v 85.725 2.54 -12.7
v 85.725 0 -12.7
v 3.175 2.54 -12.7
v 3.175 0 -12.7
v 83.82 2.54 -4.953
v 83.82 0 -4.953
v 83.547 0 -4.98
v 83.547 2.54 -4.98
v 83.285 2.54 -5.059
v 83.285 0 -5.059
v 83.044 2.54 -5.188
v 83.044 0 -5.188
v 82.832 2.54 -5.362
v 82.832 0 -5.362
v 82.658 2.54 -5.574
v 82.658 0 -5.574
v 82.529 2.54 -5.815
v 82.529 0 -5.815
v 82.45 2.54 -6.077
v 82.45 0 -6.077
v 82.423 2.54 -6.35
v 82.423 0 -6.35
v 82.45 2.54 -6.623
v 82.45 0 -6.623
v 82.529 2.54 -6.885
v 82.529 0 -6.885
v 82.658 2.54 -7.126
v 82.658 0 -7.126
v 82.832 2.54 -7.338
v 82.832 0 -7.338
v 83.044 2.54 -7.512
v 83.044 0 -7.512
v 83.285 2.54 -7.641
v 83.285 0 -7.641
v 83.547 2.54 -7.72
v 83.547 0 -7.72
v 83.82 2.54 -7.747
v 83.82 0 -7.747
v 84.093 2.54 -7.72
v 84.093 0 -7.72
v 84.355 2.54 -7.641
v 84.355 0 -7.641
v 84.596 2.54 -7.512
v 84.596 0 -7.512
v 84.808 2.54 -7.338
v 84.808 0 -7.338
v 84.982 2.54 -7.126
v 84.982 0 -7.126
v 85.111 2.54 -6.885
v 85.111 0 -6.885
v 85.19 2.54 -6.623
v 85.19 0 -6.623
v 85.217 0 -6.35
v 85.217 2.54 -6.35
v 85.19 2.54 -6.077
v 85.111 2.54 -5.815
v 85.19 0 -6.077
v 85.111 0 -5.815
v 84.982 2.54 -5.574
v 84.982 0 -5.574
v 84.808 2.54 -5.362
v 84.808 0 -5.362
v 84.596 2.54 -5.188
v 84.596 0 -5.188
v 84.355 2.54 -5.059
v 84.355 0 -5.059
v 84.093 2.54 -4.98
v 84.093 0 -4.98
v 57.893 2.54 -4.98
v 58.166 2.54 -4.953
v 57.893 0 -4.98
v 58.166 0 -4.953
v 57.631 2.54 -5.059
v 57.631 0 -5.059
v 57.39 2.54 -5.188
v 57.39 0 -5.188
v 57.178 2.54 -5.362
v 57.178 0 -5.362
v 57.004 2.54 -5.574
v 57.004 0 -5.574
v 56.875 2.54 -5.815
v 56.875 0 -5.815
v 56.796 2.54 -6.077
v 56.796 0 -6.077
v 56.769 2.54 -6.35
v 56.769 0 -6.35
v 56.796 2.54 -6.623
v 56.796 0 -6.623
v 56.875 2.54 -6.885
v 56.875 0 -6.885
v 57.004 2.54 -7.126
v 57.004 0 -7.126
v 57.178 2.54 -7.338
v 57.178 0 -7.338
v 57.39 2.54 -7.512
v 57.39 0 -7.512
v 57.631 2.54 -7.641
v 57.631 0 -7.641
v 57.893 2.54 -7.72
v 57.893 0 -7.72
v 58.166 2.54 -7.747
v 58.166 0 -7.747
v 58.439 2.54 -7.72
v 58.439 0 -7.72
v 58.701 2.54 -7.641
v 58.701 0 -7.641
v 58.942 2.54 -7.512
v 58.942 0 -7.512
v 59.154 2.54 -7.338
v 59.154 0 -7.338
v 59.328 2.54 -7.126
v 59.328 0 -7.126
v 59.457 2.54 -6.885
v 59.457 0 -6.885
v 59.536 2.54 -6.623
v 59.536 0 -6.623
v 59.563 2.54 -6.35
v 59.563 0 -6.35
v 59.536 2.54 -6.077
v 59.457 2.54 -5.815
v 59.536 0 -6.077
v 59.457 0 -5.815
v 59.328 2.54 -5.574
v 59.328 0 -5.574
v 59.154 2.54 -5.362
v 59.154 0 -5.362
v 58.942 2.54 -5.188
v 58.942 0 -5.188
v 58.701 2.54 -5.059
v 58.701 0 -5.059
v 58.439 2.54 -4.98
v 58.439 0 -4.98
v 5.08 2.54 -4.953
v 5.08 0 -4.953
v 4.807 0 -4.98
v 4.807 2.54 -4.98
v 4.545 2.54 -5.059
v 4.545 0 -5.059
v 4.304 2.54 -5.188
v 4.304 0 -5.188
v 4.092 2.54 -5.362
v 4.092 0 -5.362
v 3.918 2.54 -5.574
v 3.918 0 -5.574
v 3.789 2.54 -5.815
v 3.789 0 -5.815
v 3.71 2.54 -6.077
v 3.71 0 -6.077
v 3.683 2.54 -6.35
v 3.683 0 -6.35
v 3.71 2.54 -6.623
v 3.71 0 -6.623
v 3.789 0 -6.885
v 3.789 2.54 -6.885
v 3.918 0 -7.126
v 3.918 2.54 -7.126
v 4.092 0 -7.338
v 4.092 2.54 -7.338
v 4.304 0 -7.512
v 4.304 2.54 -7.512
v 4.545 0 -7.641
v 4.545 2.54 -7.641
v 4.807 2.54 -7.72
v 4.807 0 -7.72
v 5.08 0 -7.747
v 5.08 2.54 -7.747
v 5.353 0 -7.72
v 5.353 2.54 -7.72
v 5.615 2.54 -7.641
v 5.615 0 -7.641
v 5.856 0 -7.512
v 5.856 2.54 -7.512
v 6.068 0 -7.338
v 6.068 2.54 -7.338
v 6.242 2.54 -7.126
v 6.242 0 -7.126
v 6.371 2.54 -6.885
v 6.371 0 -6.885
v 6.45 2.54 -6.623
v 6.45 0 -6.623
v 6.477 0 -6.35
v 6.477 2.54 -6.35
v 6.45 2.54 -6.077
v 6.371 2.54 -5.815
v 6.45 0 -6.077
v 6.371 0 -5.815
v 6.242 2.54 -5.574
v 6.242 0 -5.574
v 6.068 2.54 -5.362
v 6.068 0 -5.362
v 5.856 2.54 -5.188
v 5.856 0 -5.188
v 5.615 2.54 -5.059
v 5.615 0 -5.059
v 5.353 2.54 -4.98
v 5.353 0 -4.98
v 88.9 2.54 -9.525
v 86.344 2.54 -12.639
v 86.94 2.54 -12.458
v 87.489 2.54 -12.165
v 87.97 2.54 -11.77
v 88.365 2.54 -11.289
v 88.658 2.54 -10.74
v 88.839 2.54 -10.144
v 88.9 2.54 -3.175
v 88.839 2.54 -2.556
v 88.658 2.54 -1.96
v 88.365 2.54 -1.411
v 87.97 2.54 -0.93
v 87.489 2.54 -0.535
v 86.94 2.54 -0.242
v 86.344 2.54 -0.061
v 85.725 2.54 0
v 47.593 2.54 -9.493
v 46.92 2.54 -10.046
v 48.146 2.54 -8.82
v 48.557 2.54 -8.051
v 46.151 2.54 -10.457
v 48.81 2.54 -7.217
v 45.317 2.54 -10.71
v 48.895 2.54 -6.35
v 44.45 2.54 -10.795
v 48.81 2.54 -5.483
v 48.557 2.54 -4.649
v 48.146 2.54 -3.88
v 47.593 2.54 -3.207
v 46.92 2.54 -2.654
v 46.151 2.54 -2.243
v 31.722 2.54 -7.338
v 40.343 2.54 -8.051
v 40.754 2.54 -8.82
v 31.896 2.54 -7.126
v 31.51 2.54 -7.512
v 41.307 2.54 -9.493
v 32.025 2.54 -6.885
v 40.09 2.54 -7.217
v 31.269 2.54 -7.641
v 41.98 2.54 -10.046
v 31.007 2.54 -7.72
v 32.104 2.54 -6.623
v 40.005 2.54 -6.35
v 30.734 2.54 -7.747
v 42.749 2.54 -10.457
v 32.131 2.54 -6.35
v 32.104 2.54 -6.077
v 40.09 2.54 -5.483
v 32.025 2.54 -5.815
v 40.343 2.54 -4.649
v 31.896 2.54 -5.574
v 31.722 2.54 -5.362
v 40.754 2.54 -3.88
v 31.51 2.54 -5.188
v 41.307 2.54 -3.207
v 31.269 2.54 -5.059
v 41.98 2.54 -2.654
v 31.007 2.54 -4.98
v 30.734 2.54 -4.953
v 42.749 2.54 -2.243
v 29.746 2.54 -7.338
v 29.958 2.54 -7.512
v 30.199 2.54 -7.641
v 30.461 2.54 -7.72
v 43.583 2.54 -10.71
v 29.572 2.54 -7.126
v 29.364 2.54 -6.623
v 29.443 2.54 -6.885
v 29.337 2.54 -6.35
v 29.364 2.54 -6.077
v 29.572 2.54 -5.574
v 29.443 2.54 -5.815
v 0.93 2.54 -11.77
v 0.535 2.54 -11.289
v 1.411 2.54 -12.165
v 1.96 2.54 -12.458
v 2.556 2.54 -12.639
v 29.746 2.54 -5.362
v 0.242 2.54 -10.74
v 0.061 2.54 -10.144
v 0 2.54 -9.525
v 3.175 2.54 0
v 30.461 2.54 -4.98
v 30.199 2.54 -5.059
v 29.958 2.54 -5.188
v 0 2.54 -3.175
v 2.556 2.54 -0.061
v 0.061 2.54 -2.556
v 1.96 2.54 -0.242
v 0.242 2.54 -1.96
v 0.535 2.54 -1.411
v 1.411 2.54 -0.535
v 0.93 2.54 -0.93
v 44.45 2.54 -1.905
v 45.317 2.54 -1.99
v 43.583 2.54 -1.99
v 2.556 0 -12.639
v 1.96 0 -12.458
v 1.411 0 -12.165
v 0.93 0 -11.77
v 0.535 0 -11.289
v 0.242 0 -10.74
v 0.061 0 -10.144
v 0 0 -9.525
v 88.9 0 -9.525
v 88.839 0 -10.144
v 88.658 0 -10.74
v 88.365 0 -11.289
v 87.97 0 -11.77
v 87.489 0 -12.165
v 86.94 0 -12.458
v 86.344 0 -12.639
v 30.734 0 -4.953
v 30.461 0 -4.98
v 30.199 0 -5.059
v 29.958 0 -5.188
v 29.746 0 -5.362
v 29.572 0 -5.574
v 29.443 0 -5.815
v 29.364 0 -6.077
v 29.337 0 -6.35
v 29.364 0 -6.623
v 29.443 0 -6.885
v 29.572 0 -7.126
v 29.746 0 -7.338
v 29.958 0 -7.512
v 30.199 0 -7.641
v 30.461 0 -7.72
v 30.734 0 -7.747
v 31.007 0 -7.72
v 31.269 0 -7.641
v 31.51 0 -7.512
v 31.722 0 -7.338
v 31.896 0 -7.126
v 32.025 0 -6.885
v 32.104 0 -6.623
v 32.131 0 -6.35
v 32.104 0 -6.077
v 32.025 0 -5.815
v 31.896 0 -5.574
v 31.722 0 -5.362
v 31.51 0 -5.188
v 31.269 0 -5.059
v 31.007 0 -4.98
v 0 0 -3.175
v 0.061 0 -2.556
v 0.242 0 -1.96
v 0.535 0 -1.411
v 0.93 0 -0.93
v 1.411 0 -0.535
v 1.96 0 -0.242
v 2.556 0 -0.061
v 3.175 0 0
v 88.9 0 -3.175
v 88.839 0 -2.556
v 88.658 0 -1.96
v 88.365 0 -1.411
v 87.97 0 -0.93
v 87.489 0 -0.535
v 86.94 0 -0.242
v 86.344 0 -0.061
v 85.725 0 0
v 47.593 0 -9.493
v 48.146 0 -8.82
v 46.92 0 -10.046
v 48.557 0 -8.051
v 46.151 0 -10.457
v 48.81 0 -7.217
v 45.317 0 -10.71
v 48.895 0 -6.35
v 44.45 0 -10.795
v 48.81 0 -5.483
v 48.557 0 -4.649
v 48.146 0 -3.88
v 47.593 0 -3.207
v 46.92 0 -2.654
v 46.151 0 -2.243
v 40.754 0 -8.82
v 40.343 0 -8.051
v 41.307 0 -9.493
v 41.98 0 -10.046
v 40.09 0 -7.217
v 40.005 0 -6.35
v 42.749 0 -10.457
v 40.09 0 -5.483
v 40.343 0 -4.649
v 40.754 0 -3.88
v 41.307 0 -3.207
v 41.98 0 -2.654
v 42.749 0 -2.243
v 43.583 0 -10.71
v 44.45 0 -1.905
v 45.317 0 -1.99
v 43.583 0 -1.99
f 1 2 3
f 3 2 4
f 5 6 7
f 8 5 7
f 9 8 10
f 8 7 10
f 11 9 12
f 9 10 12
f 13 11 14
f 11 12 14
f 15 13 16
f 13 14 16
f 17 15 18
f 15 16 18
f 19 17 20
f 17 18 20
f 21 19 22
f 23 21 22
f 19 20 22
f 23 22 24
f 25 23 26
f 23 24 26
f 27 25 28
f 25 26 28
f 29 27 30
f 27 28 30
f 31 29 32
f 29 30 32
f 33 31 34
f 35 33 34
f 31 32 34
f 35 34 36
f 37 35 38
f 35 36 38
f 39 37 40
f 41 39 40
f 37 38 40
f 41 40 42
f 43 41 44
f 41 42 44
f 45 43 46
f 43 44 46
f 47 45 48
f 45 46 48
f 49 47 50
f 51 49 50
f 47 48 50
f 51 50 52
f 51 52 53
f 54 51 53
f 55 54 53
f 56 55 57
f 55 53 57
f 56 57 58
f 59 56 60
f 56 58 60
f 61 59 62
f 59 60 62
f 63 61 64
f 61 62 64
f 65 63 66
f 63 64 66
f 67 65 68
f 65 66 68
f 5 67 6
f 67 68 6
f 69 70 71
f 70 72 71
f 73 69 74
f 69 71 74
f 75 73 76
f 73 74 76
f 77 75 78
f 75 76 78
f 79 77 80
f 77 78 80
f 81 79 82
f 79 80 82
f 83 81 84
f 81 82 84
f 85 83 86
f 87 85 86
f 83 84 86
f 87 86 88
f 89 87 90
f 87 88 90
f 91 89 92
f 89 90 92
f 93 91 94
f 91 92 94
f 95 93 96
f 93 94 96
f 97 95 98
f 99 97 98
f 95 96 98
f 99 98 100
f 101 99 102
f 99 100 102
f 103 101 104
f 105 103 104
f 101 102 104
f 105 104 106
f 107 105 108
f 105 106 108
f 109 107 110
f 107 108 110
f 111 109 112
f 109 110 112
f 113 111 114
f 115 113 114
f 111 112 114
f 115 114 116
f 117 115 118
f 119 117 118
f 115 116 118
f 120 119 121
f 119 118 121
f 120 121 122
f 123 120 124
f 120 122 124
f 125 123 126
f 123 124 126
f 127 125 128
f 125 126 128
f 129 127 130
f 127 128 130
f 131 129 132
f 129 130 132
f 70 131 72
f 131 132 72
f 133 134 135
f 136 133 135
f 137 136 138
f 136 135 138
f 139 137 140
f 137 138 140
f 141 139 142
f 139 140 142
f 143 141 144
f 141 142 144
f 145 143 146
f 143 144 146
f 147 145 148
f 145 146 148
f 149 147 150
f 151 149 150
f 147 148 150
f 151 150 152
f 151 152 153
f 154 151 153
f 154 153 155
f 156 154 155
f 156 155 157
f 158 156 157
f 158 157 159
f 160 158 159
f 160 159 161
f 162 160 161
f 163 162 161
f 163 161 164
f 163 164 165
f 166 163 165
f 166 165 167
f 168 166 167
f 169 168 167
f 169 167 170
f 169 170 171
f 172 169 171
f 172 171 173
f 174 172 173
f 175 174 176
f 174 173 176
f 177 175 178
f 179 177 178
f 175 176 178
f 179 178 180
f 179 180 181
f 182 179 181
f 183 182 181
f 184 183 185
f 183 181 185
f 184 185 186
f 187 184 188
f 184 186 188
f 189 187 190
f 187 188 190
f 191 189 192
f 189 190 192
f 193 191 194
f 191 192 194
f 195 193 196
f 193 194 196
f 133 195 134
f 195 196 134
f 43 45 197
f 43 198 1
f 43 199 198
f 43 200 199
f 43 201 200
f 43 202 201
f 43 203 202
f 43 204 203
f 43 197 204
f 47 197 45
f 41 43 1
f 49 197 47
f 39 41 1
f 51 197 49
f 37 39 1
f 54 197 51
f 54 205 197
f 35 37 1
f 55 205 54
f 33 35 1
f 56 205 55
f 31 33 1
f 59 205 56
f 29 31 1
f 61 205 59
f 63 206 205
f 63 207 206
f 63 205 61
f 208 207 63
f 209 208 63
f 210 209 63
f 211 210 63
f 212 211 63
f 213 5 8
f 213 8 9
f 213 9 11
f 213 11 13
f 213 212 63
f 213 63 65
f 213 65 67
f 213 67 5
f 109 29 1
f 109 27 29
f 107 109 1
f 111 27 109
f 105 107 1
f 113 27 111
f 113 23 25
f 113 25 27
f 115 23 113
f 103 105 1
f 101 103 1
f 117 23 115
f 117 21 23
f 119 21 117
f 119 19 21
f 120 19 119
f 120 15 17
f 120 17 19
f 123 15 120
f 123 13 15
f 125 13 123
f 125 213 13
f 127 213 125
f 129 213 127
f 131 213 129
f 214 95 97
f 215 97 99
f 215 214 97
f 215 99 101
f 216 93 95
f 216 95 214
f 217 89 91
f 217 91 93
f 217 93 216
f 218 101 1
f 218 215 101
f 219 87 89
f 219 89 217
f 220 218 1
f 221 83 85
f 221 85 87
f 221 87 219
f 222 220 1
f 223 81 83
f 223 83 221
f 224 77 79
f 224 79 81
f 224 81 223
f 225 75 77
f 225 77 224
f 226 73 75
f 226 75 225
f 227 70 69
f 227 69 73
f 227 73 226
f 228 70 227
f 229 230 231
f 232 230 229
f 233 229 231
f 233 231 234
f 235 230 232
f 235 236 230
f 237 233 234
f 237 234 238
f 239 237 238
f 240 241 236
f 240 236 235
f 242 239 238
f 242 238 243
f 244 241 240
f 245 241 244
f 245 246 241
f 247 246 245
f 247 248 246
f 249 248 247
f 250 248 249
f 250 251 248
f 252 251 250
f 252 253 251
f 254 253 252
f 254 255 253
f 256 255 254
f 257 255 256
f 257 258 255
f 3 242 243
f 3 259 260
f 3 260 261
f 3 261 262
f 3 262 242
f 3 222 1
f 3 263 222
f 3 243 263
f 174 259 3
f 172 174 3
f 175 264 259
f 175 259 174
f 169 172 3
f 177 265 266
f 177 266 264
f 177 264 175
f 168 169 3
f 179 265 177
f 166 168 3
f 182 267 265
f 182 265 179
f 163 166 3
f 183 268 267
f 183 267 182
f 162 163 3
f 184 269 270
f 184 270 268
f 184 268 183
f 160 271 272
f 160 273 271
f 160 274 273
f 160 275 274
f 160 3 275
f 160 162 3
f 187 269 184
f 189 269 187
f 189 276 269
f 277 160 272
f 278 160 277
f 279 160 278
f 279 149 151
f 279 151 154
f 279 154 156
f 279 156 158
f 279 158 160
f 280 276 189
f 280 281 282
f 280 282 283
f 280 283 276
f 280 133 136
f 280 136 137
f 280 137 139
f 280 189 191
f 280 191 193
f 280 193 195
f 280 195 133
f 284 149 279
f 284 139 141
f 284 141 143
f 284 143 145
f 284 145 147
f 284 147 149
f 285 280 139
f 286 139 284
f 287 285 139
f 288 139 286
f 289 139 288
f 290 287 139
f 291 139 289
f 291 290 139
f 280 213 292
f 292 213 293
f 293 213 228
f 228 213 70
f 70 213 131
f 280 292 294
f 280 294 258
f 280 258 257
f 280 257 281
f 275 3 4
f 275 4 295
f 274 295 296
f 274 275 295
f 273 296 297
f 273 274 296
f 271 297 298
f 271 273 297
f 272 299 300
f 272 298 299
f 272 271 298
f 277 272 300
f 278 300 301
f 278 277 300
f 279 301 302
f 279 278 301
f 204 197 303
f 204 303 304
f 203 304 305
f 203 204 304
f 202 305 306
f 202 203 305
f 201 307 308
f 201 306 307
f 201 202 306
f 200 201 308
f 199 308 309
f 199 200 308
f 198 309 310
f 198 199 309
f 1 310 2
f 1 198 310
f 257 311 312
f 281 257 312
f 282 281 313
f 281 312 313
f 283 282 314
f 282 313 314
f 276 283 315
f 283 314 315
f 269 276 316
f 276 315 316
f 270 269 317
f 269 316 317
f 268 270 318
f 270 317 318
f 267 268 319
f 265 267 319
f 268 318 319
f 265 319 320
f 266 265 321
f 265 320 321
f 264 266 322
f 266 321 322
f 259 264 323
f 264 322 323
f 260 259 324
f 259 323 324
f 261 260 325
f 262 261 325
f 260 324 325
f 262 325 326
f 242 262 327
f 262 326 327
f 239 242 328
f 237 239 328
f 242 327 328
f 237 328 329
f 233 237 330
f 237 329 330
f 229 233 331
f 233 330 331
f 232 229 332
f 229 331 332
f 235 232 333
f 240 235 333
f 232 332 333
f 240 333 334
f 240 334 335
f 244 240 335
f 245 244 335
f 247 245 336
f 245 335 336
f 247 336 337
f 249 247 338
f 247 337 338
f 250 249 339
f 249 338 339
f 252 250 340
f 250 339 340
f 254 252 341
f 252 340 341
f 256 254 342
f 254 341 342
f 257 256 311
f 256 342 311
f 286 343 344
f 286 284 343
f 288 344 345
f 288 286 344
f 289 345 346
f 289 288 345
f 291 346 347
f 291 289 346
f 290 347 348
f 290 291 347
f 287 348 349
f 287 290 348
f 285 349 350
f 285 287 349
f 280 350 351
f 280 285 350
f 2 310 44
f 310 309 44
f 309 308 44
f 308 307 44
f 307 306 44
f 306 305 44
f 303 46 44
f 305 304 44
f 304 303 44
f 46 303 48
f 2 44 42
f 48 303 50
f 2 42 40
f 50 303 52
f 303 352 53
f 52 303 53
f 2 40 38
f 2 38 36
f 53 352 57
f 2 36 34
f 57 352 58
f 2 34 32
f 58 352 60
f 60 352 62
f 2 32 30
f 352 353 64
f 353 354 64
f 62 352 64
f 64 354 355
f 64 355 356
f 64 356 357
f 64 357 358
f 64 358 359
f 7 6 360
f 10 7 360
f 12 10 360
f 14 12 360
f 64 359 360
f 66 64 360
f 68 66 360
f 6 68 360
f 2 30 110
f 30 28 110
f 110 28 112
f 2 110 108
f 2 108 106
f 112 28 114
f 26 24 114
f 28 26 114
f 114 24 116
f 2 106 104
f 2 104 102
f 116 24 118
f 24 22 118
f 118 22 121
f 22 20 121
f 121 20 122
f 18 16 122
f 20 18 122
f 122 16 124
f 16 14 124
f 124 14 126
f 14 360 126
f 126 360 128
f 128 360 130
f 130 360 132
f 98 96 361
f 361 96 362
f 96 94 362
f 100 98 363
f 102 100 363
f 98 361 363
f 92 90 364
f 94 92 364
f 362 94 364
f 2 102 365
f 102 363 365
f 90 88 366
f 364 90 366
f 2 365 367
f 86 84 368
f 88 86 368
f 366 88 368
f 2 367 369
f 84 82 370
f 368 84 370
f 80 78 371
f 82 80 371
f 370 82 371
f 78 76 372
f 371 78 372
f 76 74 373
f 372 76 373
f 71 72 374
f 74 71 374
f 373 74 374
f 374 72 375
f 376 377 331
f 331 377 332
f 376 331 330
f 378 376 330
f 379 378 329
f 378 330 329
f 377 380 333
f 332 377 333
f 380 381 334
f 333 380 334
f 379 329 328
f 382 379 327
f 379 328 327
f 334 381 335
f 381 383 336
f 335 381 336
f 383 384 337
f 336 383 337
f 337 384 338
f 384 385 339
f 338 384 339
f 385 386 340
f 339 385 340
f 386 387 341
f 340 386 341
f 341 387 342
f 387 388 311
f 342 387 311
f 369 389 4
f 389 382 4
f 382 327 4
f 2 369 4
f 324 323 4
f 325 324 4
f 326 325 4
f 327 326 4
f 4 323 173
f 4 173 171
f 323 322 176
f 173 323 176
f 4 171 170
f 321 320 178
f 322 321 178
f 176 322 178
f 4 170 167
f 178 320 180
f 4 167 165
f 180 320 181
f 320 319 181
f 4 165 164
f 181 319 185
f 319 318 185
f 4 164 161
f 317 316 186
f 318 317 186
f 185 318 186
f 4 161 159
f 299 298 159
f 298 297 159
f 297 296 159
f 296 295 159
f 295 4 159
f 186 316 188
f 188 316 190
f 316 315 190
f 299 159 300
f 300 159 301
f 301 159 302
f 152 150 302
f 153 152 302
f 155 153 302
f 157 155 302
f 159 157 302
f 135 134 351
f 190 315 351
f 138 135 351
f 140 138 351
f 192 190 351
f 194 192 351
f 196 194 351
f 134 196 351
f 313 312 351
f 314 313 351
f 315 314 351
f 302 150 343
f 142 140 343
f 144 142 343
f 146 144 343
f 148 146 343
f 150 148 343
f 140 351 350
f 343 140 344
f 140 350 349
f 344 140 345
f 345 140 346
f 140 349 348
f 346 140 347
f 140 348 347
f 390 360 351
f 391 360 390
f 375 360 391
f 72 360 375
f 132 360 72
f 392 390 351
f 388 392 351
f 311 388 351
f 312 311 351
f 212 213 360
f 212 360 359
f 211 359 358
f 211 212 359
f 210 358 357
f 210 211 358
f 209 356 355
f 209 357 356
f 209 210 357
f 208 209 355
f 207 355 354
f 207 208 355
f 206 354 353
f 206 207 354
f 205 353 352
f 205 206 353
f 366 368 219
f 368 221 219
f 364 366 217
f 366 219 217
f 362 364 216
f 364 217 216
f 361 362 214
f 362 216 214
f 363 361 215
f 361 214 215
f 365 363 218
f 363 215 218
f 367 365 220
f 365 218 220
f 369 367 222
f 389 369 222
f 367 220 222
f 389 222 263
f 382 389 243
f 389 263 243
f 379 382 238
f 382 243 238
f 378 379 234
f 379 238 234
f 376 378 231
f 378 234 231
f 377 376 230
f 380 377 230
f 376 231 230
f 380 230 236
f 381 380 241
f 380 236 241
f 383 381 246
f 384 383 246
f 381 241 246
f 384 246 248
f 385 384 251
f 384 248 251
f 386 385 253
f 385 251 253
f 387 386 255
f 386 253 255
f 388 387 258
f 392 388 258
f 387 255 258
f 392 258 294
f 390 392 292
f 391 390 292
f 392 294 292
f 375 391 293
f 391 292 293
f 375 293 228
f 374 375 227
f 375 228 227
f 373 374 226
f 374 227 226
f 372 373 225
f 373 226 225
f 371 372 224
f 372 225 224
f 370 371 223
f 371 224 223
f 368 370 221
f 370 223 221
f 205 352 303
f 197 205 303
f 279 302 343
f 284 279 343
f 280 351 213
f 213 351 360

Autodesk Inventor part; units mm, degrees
ref_plane "YZ Plane" through (0, 0, 0) normal (1, 0, 0) x (0, 1, 0)
ref_plane "XZ Plane" through (0, 0, 0) normal (0, 1, 0) x (-1, 0, 0)
ref_plane "XY Plane" through (0, 0, 0) normal (0, 0, 1) x (1, 0, 0)
sketch "Sketch1" plane through (0, 0, 0) normal (0, 1, 0) x (-1, 0, 0)
  line L0 (0, 0) -> (-88.9, 0)
  line L1 (-88.9, 0) -> (-88.9, -12.7)
  line L2 (-88.9, -12.7) -> (0, -12.7)
  line L3 (0, -12.7) -> (0, 0)
  dimension "d0" = 88.9
  dimension "d1" = 12.7
extrude "Extrusion1" add sketch "Sketch1" along normal blind 2.54
fillet "Fillet1" radius 3.175 4 edges at (88.9, 1.27, 0) (88.9, 1.27, -12.7) (0, 1.27, -12.7) (0, 1.27, 0)
sketch "Sketch2" plane through (0, 2.54, 0) normal (0, 1, 0) x (1, 0, 0)
  line L0 (88.9, 3.175) -> (88.9, 9.525) projected
  line L1 (88.9, 6.35) -> (44.45, 6.35)
  circle A0 centre (44.45, 6.35) radius 4.445
  point P0 (0, 0)
  dimension "d5" = 44.45
  dimension "d6" = 8.89
extrude "Extrusion2" cut sketch "Sketch2" against normal blind 2.54
sketch "Sketch3" plane through (0, 2.54, 0) normal (0, 1, 0) x (1, 0, 0)
  line L0 (3.175, 0) -> (85.725, 0) projected
  line L1 (44.45, 0) -> (44.45, 12.7)
  line L2 (85.725, 12.7) -> (3.175, 12.7) projected
  line L3 (44.45, 6.35) -> (58.166, 6.35)
  point P0 (0, 0)
  dimension "d9" = 13.716
hole "Hole1" at (58.166, 2.54, -6.35) direction (0, -1, 0) diameter 2.794 end through all
sketch "Sketch4" plane through (0, 2.54, 0) normal (0, 1, 0) x (1, 0, 0)
  line L0 (85.725, 12.7) -> (3.175, 12.7) projected
  line L1 (44.45, 12.7) -> (44.45, 0)
  line L2 (3.175, 0) -> (85.725, 0) projected
  line L3 (44.45, 6.35) -> (30.734, 6.35)
  point P0 (0, 0)
  dimension "d17" = 13.716
hole "Hole2" at (30.734, 2.54, -6.35) direction (0, -1, 0) diameter 2.794 end through all
sketch "Sketch5" plane through (0, 2.54, 0) normal (0, 1, 0) x (1, 0, 0)
  line L0 (0, 9.525) -> (0, 3.175) projected
  line L1 (0, 6.35) -> (5.08, 6.35)
  point P0 (0, 0)
  dimension "d25" = 5.08
hole "Hole3" at (5.08, 2.54, -6.35) direction (0, -1, 0) diameter 2.794 end through all
sketch "Sketch6" plane through (0, 2.54, 0) normal (0, 1, 0) x (1, 0, 0)
  line L0 (88.9, 3.175) -> (88.9, 9.525) projected
  line L1 (88.9, 6.35) -> (83.82, 6.35)
  point P0 (0, 0)
  dimension "d33" = 5.08
hole "Hole4" at (83.82, 2.54, -6.35) direction (0, -1, 0) diameter 2.794 end through all
properties part number "Main Rod v1"
